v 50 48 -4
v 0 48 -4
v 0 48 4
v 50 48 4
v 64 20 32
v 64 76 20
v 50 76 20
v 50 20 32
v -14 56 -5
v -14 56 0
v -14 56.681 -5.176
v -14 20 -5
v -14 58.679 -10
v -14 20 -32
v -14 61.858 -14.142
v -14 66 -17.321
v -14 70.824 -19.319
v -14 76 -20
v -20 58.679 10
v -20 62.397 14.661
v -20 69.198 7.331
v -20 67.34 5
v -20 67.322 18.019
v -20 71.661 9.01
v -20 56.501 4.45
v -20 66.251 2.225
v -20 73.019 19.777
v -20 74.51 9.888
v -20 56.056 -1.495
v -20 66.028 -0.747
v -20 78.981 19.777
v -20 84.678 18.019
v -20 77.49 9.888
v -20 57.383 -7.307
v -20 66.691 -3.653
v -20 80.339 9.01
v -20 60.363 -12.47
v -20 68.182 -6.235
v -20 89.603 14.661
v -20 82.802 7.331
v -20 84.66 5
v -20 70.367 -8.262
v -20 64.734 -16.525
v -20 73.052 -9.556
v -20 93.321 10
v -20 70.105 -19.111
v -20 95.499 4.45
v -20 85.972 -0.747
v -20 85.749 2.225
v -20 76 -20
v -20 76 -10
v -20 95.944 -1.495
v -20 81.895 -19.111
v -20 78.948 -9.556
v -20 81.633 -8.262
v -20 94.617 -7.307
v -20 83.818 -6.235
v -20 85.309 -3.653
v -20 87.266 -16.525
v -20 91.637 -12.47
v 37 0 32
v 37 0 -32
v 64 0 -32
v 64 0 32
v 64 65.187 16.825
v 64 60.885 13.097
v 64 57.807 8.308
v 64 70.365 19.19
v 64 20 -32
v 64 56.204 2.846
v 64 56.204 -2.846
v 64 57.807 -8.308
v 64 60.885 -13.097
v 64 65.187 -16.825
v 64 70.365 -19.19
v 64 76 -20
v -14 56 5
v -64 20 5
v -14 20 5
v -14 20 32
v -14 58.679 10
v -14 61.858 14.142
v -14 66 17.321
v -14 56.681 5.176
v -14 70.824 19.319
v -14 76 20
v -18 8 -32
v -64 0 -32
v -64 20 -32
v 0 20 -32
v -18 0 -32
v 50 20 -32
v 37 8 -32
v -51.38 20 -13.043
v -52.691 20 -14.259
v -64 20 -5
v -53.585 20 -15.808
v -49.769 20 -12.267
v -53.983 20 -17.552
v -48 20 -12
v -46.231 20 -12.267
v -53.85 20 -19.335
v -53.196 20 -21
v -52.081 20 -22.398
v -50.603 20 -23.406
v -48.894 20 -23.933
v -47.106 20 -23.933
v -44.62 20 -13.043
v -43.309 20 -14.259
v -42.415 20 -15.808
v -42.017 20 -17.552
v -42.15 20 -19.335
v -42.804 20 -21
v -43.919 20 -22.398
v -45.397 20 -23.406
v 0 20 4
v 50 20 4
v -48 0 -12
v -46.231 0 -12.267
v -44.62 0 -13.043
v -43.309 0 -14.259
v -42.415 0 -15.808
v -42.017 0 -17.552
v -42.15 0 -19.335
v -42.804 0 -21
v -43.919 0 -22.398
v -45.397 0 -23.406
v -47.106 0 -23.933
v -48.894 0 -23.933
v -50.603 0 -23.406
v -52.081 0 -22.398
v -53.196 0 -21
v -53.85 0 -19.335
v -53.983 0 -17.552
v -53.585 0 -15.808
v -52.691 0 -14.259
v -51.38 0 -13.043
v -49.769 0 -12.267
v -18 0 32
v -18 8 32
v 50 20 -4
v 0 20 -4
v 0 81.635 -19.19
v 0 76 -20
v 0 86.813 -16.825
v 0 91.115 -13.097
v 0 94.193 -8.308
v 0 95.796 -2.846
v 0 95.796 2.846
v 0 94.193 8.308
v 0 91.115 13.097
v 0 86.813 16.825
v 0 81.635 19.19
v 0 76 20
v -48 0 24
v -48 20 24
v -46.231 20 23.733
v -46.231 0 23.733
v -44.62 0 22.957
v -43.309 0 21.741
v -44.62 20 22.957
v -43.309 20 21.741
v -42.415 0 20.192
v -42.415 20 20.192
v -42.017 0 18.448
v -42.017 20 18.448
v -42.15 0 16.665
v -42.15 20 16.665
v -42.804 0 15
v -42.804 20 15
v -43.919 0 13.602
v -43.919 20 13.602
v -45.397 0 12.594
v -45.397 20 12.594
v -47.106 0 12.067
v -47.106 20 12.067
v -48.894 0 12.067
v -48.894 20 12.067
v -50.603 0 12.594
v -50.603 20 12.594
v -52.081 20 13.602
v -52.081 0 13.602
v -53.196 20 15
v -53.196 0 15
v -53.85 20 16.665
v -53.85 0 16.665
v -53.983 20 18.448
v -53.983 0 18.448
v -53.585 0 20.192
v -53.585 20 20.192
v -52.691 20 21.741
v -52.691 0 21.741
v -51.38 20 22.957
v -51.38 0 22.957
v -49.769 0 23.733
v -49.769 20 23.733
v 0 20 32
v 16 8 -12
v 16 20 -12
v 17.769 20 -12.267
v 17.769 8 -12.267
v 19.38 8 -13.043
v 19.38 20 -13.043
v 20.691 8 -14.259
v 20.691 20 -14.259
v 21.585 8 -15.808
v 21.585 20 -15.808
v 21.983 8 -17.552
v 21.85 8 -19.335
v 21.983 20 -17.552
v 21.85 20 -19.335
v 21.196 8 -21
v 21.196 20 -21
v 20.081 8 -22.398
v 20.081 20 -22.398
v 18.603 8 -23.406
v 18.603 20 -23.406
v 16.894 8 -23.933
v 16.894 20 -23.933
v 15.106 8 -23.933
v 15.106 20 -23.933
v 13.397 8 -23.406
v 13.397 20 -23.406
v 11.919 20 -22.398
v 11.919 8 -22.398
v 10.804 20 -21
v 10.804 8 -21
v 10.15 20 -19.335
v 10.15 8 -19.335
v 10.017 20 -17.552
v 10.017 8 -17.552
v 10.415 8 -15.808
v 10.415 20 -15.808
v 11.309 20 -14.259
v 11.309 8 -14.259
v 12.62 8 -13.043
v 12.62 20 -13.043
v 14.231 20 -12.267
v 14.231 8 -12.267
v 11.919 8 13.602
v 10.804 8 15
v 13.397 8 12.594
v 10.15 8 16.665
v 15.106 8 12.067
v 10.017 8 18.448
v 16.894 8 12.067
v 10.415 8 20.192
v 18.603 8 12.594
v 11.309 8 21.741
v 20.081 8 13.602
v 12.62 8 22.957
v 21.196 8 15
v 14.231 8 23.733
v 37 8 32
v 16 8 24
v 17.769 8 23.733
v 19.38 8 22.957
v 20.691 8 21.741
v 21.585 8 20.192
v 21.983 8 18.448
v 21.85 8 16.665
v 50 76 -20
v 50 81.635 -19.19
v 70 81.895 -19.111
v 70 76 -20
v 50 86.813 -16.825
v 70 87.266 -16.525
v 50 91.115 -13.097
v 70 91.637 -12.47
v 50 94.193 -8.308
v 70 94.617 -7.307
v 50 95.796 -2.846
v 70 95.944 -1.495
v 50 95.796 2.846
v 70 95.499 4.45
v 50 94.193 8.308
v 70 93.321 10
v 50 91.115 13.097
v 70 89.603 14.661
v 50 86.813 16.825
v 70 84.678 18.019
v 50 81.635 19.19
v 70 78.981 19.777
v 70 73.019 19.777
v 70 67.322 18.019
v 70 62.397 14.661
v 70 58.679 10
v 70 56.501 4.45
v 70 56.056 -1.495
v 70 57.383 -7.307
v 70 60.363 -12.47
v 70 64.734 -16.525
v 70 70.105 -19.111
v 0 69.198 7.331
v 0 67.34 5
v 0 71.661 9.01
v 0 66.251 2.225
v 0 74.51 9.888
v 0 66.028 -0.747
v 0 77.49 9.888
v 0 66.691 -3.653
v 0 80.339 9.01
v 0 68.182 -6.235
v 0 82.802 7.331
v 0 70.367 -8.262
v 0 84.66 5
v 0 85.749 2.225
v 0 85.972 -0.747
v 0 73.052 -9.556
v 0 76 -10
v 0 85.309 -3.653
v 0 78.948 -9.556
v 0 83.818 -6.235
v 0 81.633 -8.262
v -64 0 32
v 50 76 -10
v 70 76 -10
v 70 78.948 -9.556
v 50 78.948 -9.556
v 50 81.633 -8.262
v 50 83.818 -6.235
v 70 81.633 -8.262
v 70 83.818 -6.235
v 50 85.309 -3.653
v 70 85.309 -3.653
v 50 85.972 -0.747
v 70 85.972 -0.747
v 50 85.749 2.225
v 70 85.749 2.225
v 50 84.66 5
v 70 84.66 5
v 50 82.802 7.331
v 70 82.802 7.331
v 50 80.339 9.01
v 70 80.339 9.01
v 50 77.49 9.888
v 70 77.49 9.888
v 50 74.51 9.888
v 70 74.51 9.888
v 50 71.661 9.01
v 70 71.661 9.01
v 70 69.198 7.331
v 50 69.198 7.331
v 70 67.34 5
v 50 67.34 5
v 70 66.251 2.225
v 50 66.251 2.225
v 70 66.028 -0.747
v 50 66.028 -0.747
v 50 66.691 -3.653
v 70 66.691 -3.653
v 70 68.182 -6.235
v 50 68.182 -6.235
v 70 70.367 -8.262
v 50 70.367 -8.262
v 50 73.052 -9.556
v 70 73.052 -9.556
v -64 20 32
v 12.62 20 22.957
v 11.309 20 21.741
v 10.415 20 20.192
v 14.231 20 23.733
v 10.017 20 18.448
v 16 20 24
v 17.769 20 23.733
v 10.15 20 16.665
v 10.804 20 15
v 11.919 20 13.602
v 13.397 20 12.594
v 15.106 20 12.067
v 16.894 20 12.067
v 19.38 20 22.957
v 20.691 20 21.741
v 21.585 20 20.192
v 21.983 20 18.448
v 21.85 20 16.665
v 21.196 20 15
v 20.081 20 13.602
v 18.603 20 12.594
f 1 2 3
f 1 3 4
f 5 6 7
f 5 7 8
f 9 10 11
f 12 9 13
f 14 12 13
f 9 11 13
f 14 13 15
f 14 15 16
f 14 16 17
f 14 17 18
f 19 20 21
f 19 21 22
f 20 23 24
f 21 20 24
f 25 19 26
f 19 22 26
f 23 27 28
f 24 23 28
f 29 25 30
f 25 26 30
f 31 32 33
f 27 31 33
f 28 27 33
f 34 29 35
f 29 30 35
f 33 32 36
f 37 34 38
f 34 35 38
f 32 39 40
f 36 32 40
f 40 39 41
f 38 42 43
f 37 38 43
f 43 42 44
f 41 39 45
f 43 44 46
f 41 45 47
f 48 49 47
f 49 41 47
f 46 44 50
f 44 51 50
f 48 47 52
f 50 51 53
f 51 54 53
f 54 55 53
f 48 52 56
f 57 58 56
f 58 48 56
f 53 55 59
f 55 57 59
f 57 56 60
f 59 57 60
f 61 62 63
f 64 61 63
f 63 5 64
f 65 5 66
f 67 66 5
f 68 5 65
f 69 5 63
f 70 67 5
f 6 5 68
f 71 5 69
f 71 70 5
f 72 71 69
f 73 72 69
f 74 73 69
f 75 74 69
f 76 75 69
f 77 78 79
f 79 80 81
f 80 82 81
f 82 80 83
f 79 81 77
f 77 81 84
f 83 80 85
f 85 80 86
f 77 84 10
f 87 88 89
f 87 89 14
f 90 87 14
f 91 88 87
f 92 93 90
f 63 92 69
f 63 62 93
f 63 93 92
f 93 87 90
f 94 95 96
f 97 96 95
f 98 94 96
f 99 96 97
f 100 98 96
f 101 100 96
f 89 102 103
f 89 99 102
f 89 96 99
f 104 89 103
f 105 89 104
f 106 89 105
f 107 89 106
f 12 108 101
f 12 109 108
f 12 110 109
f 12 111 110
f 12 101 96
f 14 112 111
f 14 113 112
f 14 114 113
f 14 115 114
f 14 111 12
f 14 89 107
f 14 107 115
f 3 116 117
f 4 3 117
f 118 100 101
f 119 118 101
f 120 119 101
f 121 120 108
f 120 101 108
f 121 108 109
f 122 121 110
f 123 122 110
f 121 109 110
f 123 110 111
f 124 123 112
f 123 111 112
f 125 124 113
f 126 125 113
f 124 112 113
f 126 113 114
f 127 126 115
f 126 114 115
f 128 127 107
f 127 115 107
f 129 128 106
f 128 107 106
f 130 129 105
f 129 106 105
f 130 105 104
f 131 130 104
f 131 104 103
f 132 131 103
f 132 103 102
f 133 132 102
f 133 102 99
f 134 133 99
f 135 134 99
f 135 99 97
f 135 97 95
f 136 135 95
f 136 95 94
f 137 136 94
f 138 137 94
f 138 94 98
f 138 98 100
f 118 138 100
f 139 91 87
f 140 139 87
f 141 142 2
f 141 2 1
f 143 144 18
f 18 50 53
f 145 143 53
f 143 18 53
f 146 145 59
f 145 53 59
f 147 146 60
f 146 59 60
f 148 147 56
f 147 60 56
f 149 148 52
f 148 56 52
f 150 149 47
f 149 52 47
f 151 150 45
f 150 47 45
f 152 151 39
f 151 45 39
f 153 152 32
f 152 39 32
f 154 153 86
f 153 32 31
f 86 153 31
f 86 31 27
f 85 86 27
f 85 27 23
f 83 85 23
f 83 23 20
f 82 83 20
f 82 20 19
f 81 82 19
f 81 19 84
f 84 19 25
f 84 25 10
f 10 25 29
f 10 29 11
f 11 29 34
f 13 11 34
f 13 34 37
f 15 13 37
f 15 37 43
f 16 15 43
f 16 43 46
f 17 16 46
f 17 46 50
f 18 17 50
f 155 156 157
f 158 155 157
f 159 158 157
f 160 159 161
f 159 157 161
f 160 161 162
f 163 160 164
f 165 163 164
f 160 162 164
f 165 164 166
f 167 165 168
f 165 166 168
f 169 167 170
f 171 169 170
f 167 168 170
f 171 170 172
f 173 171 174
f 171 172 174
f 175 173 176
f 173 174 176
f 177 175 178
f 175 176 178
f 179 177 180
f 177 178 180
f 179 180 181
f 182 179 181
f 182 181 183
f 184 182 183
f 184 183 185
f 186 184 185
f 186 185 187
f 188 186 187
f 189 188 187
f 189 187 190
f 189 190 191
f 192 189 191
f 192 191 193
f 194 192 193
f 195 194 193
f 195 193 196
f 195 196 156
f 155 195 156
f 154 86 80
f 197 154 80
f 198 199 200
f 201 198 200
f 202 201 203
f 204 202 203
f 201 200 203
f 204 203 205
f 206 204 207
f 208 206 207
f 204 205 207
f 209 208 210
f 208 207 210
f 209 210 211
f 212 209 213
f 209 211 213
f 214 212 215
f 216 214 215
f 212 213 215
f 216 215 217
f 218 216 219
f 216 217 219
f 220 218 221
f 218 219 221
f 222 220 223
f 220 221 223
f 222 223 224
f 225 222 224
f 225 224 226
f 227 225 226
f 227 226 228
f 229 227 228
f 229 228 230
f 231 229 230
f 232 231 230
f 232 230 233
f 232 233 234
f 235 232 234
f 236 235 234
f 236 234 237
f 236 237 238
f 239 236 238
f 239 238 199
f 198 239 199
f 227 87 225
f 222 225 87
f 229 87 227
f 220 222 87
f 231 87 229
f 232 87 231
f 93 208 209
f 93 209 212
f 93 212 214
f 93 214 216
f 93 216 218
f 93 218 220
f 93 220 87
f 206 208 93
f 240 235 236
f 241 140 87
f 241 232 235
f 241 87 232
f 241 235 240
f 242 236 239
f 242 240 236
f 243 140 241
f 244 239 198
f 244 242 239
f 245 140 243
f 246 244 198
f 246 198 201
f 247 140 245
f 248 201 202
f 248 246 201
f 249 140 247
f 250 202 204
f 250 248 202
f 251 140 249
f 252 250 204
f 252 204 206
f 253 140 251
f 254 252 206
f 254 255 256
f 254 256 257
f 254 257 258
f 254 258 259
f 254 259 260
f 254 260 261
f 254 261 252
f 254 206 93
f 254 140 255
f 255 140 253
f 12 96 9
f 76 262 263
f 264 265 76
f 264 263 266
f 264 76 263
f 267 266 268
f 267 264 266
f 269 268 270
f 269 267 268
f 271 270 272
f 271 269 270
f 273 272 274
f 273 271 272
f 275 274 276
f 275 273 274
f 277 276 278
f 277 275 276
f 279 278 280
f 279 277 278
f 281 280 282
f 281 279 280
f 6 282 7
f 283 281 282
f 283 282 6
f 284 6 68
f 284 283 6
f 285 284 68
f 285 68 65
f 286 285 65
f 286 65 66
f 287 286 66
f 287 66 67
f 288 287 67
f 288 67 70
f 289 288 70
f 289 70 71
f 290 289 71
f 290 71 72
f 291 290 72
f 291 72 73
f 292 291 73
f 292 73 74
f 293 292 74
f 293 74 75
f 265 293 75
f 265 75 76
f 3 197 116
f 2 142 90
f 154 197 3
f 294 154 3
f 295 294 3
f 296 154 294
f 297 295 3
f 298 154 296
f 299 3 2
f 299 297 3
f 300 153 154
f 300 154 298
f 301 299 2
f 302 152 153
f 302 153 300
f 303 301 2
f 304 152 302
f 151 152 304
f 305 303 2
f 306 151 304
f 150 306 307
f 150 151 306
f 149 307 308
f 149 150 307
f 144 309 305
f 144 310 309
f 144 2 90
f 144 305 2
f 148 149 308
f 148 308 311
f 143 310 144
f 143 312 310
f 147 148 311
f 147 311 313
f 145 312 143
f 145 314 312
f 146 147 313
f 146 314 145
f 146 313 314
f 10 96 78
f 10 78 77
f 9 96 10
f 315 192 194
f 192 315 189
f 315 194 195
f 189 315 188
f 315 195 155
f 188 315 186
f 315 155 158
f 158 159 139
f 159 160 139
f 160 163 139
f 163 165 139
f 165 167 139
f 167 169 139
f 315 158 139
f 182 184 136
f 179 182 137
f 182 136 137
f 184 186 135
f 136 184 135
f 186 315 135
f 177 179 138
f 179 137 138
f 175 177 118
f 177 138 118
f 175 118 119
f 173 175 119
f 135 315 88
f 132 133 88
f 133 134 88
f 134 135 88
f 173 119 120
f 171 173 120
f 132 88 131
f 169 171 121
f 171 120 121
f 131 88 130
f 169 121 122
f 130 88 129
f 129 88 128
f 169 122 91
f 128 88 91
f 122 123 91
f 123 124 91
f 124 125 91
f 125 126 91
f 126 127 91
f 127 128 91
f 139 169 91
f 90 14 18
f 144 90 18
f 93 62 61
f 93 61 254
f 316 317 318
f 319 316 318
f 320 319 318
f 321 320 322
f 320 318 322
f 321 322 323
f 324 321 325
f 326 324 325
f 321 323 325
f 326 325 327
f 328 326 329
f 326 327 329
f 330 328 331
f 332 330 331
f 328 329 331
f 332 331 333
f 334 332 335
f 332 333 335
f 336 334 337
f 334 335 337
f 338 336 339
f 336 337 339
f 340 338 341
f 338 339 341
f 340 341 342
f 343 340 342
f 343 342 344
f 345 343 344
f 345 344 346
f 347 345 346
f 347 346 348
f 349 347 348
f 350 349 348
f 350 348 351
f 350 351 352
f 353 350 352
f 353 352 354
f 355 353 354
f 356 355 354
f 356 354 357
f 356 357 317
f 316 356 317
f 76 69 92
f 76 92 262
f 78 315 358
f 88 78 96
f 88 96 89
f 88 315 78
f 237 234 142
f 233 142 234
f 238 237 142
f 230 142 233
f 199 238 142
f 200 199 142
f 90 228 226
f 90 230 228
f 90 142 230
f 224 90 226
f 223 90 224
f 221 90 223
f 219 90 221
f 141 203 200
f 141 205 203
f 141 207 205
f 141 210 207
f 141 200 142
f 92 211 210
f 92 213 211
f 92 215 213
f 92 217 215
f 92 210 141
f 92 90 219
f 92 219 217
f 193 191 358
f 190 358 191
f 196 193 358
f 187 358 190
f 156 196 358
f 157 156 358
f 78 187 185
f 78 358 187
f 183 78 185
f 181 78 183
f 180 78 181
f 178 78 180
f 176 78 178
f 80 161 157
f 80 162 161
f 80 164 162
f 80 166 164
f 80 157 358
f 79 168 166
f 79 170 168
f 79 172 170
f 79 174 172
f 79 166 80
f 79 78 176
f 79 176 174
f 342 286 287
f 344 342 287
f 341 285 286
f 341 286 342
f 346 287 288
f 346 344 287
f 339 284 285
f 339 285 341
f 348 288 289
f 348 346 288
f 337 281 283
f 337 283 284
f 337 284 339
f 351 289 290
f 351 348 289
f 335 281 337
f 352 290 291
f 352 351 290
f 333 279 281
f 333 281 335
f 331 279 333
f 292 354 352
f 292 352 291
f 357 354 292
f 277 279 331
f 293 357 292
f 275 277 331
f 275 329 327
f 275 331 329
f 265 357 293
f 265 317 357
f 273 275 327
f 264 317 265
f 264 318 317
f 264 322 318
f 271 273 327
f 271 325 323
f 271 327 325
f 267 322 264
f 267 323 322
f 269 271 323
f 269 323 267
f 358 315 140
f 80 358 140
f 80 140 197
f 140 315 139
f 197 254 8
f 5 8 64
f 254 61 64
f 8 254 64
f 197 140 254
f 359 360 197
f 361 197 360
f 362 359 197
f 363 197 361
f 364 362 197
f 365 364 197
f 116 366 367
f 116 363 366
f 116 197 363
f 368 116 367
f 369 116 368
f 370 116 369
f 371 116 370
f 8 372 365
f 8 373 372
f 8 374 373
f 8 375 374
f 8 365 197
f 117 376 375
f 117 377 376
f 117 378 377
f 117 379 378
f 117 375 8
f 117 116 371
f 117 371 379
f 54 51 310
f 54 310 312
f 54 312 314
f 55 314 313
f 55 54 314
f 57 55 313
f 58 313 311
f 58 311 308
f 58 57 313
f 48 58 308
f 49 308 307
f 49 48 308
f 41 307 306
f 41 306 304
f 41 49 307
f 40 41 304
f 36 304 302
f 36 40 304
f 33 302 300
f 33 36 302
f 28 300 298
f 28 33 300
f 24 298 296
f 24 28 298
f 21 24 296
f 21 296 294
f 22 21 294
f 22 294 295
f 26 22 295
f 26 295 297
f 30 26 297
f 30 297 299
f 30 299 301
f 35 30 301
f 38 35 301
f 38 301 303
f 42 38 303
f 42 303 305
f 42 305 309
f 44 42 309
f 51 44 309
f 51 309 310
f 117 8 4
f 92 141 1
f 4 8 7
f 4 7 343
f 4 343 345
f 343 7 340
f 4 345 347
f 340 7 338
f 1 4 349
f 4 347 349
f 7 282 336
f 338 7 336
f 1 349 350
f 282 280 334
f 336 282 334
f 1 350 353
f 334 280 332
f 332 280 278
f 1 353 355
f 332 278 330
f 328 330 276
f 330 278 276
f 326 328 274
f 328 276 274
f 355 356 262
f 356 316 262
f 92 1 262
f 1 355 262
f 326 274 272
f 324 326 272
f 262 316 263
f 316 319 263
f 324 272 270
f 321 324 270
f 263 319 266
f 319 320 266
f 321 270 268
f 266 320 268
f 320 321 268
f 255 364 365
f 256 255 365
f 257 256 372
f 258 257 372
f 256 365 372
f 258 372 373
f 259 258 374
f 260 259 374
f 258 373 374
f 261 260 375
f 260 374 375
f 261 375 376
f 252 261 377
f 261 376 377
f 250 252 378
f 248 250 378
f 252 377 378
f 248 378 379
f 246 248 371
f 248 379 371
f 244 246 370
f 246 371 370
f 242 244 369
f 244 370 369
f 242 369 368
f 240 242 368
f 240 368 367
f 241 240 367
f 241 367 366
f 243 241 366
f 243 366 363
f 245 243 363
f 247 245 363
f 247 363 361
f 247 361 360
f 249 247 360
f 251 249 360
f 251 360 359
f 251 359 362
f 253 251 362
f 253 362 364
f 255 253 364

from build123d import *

# Parameters (mm, degrees)
SKETCH1_W           = 128
SKETCH1_H           = 64
BOSS_EXTRUDE1_DEPTH = 20
SKETCH2_W           = 55
SKETCH2_H           = 8
CUT_EXTRUDE1_DEPTH  = 93.69304181
SKETCH4_R           = 10
BOSS_EXTRUDE3_DEPTH = 14
BOSS_EXTRUDE4_START = 6
SKETCH4_3_R         = 10
BOSS_EXTRUDE4_DEPTH = 6
SKETCH18_W          = 50
SKETCH18_H          = 8
BOSS_EXTRUDE6_DEPTH = 28
RIB1_REACH          = 125.045
SKETCH19_WALL_W     = 309.701101848
SKETCH19_WALL_H     = 10
SKETCH20_R          = 6
CUT_EXTRUDE2_DEPTH  = 109.166538264
SKETCH21_R          = 6
CUT_EXTRUDE3_DEPTH  = 109.166538264
SKETCH22_R          = 6
CUT_EXTRUDE4_DEPTH  = 109.166538264


with BuildPart() as part:
    # Sketch1 → Boss-Extrude1 (new body)
    with BuildSketch(Plane(origin=(0, 0, 0), x_dir=(1, 0, 0), z_dir=(0, 1, 0))):
        Rectangle(SKETCH1_W, SKETCH1_H)
    extrude(amount=BOSS_EXTRUDE1_DEPTH)

    # Sketch2 → Cut-Extrude1 (cut, through all)
    with BuildSketch(Plane.XY.offset(32)):
        with Locations((9.5, 4)):
            Rectangle(SKETCH2_W, SKETCH2_H)
    extrude(amount=-CUT_EXTRUDE1_DEPTH, mode=Mode.SUBTRACT)

    # Sketch4 → Boss-Extrude3 (add)
    with BuildSketch(Plane(origin=(64, 0, 0), x_dir=(0, 0, -1), z_dir=(1, 0, 0))):
        with BuildLine():
            Line((32, 20), (20, 76))
            ThreePointArc((20, 76), (0, 96), (-20, 76))
            Line((-20, 76), (-32, 20))
            Line((-32, 20), (32, 20))
        make_face()
        with Locations((0, 76)):
            Circle(SKETCH4_R, mode=Mode.SUBTRACT)
    boss_extrude3 = extrude(amount=-BOSS_EXTRUDE3_DEPTH)

    # Sketch4<3> → Boss-Extrude4 (add)
    with BuildSketch(Plane(origin=(64, 0, 0), x_dir=(0, 0, -1), z_dir=(1, 0, 0)).offset(BOSS_EXTRUDE4_START)):
        with BuildLine():
            ThreePointArc((-20, 76), (0, 56), (20, 76))
            ThreePointArc((20, 76), (0, 96), (-20, 76))
        make_face()
        with Locations((0, 76)):
            Circle(SKETCH4_3_R, mode=Mode.SUBTRACT)
    boss_extrude4 = extrude(amount=-BOSS_EXTRUDE4_DEPTH)

    # Mirror2: Boss-Extrude3, Boss-Extrude4 across plane
    add(boss_extrude3.mirror(Plane.ZY.offset(-25)))
    add(boss_extrude4.mirror(Plane.ZY.offset(-25)))

    # Sketch18 → Boss-Extrude6 (add)
    with BuildSketch(Plane(origin=(0, 20, 0), x_dir=(1, 0, 0), z_dir=(0, 1, 0))):
        with Locations((25, 0)):
            Rectangle(SKETCH18_W, SKETCH18_H)
    extrude(amount=BOSS_EXTRUDE6_DEPTH)

    # Sketch19 wall → Rib1 (add, up to next)
    with BuildSketch(Plane(origin=(-39, 38, 0), x_dir=(0.811534341451, 0.584304725845, 0), z_dir=(-0.584304725845, 0.811534341451, 0)), mode=Mode.PRIVATE) as rib1_sk1:
        Rectangle(SKETCH19_WALL_W, SKETCH19_WALL_H)
    rib1_tool1 = extrude(rib1_sk1.sketch, amount=-RIB1_REACH, mode=Mode.PRIVATE) - part.part
    add(rib1_tool1.solids().sort_by_distance((-39, 38, 0))[0])

    # Sketch20 → Cut-Extrude2 (cut, through all)
    with BuildSketch(Plane(origin=(0, 20, 0), x_dir=(1, 0, 0), z_dir=(0, 1, 0))):
        with Locations((16, -18)):
            Circle(SKETCH20_R)
    extrude(amount=-CUT_EXTRUDE2_DEPTH, mode=Mode.SUBTRACT)

    # Sketch21 → Cut-Extrude3 (cut, through all)
    with BuildSketch(Plane(origin=(0, 20, 0), x_dir=(1, 0, 0), z_dir=(0, 1, 0))):
        with Locations((16, 18)):
            Circle(SKETCH21_R)
    extrude(amount=-CUT_EXTRUDE3_DEPTH, mode=Mode.SUBTRACT)

    # Sketch22 → Cut-Extrude4 (cut, through all)
    with BuildSketch(Plane(origin=(0, 20, 0), x_dir=(1, 0, 0), z_dir=(0, 1, 0))):
        with Locations((-48, -18)):
            Circle(SKETCH22_R)
        with Locations((-48, 18)):
            Circle(SKETCH22_R)
    extrude(amount=-CUT_EXTRUDE4_DEPTH, mode=Mode.SUBTRACT)


solid = part.part
